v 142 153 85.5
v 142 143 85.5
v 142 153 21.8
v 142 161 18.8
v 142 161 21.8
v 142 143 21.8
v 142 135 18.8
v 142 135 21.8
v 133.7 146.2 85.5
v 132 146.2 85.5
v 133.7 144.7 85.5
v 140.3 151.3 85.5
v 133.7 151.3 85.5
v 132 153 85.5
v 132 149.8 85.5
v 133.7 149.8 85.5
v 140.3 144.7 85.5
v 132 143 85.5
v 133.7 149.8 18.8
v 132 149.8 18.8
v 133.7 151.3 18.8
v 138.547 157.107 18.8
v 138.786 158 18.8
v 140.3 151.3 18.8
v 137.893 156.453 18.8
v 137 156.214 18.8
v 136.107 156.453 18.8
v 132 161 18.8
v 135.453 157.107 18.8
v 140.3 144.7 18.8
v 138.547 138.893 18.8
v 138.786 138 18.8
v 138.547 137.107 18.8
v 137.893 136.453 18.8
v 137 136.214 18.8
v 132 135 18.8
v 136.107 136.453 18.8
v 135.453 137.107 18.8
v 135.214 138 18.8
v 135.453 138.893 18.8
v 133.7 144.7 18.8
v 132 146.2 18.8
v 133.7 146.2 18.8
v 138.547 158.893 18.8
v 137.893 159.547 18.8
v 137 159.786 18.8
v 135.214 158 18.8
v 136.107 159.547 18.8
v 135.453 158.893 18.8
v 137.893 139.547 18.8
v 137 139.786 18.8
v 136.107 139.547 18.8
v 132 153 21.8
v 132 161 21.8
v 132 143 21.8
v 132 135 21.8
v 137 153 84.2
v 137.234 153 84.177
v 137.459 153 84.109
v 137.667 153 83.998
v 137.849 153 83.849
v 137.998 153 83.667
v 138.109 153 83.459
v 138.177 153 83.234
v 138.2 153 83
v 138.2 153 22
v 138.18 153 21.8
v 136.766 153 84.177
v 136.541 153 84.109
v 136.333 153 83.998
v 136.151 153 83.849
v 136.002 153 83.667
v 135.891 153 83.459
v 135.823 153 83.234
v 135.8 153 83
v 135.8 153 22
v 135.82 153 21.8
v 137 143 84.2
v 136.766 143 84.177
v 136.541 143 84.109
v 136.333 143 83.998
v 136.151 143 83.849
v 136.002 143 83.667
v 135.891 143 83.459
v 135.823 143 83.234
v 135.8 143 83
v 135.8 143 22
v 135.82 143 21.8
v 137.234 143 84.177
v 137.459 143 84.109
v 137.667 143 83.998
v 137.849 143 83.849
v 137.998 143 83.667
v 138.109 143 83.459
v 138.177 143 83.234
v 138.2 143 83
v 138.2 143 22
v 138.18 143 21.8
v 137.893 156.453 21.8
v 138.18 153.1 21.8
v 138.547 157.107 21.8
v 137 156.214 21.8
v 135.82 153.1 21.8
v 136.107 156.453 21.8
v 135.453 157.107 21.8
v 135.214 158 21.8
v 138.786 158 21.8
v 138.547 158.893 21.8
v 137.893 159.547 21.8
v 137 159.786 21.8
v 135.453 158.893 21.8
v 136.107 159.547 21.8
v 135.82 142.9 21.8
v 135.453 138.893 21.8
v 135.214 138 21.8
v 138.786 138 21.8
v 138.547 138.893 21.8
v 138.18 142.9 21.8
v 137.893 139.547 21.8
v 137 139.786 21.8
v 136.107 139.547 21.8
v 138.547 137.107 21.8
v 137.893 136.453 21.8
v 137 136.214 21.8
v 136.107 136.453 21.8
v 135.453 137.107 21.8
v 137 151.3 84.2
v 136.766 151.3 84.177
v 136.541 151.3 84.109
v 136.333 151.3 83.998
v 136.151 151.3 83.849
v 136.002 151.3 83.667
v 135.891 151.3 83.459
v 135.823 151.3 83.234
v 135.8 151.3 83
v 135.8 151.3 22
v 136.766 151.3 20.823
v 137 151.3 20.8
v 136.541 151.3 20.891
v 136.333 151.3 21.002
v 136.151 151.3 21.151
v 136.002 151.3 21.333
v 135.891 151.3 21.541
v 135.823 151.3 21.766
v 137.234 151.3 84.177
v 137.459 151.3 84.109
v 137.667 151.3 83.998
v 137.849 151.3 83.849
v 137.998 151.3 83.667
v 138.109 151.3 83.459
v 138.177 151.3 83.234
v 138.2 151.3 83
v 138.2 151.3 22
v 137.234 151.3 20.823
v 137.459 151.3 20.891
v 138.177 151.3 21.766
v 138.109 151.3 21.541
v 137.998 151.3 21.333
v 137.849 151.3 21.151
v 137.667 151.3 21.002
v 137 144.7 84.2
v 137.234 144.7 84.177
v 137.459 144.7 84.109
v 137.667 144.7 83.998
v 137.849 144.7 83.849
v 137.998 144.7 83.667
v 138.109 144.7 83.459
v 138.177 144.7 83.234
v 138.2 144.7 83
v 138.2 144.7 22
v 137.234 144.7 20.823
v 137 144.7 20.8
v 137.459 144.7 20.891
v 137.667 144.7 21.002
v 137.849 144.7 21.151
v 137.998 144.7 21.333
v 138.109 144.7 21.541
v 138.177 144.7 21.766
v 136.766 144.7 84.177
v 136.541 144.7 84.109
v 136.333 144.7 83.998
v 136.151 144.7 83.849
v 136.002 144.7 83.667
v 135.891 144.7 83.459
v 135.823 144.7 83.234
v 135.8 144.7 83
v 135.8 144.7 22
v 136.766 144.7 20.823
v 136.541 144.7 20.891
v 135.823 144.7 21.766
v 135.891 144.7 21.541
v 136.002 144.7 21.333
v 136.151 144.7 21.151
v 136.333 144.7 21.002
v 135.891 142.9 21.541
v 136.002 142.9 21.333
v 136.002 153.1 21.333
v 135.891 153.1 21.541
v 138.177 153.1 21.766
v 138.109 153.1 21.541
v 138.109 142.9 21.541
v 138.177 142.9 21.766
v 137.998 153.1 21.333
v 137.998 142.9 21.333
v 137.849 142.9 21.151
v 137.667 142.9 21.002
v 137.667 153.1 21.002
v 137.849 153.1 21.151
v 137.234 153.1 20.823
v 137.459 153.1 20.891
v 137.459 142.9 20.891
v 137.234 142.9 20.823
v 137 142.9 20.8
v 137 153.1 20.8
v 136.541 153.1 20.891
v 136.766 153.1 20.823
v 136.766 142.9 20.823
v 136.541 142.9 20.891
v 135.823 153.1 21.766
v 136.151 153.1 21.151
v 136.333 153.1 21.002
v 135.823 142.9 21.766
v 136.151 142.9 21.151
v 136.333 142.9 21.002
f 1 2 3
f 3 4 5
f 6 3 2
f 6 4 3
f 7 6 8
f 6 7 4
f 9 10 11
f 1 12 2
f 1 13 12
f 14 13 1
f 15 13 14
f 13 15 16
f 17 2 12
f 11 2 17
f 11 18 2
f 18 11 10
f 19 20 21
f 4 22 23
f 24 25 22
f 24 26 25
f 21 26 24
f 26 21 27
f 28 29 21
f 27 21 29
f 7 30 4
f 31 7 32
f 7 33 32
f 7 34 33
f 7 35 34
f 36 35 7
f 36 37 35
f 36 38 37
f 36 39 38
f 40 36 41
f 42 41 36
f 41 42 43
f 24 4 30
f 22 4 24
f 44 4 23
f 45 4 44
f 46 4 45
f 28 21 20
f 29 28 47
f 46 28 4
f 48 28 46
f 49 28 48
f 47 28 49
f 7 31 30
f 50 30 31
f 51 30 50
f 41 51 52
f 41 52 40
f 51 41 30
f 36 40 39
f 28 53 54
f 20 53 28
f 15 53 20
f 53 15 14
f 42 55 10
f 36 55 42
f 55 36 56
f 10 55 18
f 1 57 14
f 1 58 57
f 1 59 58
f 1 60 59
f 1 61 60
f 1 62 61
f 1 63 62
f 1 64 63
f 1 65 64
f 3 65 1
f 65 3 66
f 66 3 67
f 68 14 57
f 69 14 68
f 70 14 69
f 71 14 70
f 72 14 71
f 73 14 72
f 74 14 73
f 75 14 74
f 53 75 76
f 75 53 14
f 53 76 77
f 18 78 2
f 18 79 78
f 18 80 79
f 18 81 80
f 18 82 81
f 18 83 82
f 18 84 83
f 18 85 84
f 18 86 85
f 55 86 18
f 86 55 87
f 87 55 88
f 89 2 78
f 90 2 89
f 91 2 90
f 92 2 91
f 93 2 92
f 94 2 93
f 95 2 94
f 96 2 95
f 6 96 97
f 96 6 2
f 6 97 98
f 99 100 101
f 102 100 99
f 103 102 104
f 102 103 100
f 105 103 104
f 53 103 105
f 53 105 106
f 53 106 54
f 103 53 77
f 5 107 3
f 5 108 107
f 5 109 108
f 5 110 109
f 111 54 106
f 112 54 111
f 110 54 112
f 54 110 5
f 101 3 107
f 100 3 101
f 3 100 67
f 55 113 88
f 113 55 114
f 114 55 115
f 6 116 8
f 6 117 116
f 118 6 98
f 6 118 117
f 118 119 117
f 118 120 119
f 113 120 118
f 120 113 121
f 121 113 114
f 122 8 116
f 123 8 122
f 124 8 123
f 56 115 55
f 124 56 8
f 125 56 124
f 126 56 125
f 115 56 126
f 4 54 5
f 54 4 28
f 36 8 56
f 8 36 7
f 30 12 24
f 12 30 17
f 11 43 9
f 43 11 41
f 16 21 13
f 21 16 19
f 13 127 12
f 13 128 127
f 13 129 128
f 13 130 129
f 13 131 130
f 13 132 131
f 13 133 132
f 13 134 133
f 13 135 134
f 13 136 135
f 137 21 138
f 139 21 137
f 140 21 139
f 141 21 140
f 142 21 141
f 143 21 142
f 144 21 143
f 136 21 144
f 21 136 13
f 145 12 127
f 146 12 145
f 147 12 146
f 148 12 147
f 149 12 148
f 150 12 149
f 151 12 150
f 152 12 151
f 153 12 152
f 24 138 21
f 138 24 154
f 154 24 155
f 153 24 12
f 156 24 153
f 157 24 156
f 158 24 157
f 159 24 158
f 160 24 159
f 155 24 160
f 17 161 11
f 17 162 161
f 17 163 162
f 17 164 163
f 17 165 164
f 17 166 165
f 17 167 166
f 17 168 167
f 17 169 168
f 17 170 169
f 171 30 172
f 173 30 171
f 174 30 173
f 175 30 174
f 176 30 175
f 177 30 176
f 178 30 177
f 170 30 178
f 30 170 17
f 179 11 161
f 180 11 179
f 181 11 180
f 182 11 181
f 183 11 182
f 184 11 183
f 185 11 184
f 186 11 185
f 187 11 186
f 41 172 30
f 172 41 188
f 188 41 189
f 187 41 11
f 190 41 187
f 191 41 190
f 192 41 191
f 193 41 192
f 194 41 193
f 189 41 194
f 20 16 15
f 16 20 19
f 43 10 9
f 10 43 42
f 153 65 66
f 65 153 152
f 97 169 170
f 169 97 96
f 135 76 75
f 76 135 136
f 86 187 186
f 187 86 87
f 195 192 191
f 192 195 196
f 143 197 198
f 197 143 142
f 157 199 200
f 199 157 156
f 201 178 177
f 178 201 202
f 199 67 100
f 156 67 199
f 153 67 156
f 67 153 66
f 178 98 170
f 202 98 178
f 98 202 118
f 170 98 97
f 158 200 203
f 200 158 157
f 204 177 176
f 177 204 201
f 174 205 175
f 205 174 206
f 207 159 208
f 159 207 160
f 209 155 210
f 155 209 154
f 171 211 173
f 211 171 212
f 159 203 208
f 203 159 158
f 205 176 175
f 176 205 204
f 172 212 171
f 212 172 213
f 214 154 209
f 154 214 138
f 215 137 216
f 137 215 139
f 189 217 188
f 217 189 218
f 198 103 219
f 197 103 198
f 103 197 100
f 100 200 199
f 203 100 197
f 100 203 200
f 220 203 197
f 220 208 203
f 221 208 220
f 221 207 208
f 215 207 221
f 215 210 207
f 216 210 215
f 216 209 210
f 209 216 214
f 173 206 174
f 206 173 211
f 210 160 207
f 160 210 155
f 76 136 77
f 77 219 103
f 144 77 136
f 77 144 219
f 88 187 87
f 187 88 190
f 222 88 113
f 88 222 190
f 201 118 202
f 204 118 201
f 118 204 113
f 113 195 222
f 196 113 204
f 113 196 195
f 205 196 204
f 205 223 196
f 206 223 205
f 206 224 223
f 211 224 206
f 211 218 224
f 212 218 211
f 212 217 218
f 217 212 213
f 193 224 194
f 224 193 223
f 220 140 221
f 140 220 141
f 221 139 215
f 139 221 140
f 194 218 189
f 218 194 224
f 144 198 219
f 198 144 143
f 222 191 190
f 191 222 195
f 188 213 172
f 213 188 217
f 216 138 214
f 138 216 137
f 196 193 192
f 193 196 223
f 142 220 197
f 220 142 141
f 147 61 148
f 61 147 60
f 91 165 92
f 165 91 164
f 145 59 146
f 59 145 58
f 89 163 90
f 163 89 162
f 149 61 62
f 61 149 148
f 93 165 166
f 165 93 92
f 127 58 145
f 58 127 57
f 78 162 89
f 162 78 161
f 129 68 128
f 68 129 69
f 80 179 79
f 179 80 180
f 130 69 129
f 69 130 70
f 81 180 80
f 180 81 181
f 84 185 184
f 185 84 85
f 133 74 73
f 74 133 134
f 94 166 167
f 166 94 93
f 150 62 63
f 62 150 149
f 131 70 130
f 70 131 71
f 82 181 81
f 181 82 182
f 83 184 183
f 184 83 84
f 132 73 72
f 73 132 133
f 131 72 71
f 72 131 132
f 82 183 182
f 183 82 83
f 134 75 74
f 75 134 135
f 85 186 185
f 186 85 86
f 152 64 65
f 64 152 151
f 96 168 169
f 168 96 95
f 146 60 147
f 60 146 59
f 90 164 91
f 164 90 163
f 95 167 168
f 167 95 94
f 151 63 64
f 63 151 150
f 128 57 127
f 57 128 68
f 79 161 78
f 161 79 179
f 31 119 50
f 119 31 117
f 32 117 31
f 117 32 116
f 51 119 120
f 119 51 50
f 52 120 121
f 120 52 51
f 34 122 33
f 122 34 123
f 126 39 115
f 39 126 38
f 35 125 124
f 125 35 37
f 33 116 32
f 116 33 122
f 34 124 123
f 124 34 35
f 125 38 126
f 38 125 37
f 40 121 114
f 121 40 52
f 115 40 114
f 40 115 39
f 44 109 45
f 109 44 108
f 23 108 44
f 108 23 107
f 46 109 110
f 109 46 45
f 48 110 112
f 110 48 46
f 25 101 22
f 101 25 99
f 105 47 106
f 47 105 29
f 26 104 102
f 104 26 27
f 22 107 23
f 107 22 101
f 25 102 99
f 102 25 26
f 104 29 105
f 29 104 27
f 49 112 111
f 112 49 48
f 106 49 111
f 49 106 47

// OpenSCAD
// Generated from the same CSG operations as STEP. Rebuild with spec/build_parent_hand_service.py.
difference(){difference(){difference(){difference(){difference(){difference(){difference(){union(){translate([132,143,18.8]) cube([10,10,66.7]);translate([132,135,18.8]) cube([10,26,3]);}translate([133.7,144.7,18.7]) cube([6.6,6.6,66.9]);}translate([131.9,146.2,18.7]) cube([5.1,3.6,67]);}translate([135.8,142.9,22]) cube([2.4,10.2,61]);}translate([137,142.9,22]) rotate([-90,0,0]) cylinder(r=1.2,h=10.2,$fn=32);}translate([137,142.9,83]) rotate([-90,0,0]) cylinder(r=1.2,h=10.2,$fn=32);}translate([137,138,18.7]) cylinder(r=1.7858514112073933,h=3.2,$fn=12);}translate([137,158,18.7]) cylinder(r=1.7858514112073933,h=3.2,$fn=12);}
